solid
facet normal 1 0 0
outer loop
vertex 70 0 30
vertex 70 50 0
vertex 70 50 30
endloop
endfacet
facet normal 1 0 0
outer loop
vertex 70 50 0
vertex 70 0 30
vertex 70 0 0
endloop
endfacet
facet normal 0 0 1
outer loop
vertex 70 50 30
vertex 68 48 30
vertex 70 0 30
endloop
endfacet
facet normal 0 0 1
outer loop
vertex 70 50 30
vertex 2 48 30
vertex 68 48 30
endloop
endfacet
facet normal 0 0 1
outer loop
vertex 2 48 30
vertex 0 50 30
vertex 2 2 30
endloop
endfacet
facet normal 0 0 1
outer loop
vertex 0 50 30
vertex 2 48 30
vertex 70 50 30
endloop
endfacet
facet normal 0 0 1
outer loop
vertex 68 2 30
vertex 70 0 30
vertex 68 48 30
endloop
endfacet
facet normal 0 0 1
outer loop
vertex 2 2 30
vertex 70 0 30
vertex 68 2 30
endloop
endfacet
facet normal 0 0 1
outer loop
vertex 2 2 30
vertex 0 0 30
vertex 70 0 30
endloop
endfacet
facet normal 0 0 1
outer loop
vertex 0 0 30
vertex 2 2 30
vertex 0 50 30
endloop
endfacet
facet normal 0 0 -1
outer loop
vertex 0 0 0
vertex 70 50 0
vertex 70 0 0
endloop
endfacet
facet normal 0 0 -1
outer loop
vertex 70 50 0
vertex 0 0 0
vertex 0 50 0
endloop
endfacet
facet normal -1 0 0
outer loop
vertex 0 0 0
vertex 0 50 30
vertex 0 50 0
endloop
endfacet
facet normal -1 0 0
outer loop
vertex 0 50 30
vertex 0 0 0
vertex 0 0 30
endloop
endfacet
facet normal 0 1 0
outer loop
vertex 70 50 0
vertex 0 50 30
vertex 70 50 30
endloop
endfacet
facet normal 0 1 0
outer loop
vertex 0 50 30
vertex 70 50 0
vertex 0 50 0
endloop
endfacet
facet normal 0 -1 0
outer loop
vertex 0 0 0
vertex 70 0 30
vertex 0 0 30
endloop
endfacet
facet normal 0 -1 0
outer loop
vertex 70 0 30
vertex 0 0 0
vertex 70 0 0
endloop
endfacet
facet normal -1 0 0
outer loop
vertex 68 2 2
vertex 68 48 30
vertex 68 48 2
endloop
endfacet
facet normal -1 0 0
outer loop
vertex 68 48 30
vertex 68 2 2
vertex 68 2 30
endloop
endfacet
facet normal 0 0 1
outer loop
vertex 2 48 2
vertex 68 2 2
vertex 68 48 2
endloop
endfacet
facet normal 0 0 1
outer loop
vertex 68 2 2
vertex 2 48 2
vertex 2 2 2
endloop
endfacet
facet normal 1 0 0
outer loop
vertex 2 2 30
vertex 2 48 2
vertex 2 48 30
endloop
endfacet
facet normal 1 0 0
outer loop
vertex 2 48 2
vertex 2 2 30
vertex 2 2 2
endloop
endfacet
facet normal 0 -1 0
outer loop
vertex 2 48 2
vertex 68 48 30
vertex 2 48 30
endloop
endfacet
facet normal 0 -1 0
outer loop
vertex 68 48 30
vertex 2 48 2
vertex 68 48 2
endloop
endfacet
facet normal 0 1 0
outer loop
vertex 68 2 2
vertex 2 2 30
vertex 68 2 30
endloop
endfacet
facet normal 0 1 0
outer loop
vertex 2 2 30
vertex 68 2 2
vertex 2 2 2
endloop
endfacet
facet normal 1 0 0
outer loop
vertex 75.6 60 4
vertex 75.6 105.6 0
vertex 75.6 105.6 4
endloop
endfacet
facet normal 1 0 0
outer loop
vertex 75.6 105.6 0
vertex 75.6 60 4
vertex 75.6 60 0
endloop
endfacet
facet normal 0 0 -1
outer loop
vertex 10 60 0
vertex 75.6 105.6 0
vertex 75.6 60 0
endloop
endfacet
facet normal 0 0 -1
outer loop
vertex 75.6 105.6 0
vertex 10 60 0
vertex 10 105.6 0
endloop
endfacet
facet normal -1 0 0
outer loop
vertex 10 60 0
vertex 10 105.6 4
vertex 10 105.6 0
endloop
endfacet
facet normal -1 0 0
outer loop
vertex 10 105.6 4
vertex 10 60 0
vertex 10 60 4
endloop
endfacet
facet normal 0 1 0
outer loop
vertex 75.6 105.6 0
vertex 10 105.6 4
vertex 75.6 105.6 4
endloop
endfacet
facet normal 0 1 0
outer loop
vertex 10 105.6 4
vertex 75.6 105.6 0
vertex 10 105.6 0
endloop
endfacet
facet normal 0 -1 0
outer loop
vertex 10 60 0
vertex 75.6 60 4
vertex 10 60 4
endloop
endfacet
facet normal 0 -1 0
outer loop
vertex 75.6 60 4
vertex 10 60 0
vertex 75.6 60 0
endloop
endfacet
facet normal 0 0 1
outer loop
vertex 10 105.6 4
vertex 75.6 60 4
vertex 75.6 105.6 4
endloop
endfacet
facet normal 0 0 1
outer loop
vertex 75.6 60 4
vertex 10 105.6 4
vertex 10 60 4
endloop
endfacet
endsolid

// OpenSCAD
// Two-part enclosure for small electronics board
// Print orientation: both parts on the bed, lid on +X side of box

// ---- Box ----
box_x = 70;      // outer length (X)
box_y = 50;      // outer width (Y)
box_z = 30;      // outer height (Z)
wall = 2;        // wall thickness
floor = 2;       // floor thickness

// ---- Lid ----
lip_w = 65.6;    // lip outer length (X)
lip_d = 45.6;    // lip outer width (Y)
lip_h = 4;       // lip height (Z)
lip_t = 1.5;     // lip wall thickness

// ---- Misc ----
eps = 0.5;       // cutter overshoot
gap = 10;        // gap between parts on bed
$fn = 64;

// Derived
inner_x = box_x - 2*wall;
inner_y = box_y - 2*wall;
lip_f  = lip_w - inner_x + 0.4;  // clearance 0.2 each side
lip_b  = lip_d - inner_y + 0.4;

module box() {
    difference() {
        cube([box_x, box_y, box_z]);
        translate([wall, wall, floor])
            cube([inner_x, inner_y, box_z - floor]);   // open top
    }
}

module lid() {
    translate([gap, 0, 0])
        union() {
            // plate
            translate([0, 0, 0])
                cube([lip_w, lip_d, 2]);
            // lip (overlaps plate -> fuses)
            translate([-lip_f/2, -lip_b/2, 0])
                cube([lip_w, lip_d, lip_h]);
        }
}

box();
translate([0, box_y + 10, 0])
    lid();
